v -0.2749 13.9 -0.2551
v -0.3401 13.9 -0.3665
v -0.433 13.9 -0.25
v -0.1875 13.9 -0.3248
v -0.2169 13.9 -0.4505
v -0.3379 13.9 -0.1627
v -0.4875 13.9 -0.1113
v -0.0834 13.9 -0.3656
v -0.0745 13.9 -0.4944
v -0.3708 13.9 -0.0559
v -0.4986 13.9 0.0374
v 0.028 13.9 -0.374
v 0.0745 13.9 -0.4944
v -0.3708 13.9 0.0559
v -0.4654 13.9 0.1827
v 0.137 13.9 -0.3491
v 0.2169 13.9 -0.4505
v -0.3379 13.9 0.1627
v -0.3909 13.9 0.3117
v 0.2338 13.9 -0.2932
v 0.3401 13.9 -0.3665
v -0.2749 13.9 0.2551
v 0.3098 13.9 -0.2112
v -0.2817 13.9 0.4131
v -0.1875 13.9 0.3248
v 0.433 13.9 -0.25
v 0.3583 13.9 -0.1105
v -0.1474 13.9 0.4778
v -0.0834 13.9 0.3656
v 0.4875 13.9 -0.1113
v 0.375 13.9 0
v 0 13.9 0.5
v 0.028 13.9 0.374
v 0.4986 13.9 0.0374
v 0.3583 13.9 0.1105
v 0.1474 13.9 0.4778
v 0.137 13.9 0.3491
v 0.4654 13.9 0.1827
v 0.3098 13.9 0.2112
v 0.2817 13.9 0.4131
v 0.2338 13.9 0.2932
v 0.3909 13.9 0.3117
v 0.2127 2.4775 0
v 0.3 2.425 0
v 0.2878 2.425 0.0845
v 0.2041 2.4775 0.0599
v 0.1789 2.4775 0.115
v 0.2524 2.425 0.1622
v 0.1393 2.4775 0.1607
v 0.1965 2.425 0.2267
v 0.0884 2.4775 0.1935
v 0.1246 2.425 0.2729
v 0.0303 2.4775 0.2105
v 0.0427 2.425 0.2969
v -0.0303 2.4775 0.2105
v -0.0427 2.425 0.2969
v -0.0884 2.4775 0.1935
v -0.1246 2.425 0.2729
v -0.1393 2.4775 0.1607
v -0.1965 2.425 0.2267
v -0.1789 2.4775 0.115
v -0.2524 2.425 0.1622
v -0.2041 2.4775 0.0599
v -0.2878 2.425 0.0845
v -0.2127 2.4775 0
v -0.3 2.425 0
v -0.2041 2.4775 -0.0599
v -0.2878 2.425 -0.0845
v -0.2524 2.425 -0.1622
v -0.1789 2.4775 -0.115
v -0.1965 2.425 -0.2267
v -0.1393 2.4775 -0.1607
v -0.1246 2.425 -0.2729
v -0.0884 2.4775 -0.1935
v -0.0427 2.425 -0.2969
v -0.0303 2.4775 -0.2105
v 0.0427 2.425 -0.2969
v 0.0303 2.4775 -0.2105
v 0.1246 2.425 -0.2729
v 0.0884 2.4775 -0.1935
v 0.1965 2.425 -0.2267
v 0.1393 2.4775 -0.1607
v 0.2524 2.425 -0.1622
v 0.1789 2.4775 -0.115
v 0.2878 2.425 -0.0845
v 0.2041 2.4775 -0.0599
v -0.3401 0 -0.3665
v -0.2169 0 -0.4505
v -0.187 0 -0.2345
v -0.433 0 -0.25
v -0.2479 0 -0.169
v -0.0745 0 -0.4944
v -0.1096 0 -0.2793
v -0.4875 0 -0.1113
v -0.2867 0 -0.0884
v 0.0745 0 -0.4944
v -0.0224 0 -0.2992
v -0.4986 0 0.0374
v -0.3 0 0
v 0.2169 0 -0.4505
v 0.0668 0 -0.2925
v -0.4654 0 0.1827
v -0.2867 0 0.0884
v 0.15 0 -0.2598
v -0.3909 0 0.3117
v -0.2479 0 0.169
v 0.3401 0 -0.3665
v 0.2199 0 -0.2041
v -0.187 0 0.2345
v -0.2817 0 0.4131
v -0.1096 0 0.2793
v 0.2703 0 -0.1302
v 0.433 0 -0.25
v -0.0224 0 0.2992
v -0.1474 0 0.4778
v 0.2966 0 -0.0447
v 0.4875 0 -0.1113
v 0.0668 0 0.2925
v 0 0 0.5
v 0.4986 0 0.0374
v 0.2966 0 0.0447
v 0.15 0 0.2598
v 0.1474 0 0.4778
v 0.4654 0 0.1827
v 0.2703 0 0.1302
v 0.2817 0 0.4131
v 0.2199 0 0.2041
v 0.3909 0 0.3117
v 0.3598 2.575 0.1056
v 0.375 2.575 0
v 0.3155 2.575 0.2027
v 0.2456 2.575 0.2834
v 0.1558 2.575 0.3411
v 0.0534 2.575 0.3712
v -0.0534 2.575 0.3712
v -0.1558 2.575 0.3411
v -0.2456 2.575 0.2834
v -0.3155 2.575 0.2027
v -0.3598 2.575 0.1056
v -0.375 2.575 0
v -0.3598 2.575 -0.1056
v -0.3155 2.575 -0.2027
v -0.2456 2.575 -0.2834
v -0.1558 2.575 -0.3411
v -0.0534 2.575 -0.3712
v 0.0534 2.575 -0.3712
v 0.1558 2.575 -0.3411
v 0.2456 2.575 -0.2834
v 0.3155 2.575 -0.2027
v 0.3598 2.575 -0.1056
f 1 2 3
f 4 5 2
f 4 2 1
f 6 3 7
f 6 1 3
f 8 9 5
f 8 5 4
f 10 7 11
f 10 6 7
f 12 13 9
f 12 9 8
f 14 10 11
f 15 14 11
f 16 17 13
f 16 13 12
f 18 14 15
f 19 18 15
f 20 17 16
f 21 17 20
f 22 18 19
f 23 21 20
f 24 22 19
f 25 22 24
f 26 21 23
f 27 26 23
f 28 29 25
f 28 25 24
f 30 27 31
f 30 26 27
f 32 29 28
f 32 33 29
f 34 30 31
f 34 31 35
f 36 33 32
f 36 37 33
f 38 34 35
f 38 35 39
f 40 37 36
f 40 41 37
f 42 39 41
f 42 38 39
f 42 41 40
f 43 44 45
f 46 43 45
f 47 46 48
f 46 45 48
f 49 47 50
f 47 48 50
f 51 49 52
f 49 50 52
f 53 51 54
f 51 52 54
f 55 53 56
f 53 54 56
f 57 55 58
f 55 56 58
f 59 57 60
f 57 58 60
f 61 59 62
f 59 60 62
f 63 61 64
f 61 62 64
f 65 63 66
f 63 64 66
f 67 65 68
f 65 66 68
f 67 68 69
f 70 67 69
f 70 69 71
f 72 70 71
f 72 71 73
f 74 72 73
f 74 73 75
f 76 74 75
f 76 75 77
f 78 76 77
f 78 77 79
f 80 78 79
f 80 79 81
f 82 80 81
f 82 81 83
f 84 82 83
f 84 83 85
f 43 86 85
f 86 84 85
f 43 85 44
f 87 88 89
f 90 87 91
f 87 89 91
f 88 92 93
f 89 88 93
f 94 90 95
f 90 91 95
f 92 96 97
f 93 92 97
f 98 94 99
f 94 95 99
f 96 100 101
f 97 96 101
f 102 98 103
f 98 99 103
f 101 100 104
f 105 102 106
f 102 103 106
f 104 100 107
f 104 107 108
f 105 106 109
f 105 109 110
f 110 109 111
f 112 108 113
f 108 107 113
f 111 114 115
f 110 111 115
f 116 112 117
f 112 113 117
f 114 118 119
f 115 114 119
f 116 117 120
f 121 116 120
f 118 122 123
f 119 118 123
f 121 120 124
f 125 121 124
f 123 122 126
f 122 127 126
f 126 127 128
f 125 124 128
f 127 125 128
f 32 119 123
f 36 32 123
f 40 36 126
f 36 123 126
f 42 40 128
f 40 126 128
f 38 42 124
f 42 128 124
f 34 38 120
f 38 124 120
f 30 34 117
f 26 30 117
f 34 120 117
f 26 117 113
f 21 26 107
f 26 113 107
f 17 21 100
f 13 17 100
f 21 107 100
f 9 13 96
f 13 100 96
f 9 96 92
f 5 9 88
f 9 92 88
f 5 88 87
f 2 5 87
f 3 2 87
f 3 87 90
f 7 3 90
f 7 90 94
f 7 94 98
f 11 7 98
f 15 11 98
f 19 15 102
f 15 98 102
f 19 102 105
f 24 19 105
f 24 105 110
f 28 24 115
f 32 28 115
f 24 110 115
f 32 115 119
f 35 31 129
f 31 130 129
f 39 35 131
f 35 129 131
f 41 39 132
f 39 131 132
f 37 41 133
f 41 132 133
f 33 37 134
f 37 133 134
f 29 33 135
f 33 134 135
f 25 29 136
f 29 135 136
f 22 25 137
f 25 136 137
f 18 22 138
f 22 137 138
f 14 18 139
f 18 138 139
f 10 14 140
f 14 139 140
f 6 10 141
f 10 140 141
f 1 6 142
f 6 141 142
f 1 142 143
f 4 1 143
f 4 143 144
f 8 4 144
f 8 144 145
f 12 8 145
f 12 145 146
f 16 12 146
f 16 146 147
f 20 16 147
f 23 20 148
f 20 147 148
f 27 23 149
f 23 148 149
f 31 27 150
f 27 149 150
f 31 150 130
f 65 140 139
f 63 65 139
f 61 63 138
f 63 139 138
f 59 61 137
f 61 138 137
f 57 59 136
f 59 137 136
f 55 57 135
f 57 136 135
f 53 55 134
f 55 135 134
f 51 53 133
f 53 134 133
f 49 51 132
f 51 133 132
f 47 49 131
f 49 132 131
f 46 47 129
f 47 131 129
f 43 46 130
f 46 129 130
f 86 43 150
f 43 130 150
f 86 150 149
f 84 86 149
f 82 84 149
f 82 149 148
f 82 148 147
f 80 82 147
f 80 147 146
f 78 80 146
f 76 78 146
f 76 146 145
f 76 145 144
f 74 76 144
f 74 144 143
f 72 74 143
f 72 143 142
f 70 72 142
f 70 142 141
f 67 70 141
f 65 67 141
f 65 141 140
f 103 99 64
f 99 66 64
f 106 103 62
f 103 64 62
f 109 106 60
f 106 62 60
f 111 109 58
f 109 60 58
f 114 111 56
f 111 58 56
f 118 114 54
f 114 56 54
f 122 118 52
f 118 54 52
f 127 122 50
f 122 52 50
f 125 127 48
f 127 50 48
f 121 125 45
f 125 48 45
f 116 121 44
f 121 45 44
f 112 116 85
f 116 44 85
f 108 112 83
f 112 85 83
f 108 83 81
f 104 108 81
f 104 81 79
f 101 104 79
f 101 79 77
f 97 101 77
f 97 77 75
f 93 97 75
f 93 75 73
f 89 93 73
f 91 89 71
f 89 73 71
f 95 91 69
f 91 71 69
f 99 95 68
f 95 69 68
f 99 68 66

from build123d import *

# Parameters (mm, degrees)
SKETCH1_R                        = 0.5
BOSS_EXTRUDE1_DEPTH              = 13.9
F_0_4_0_4_DIAMETER_HOLE1_D       = 0.4
F_0_75_0_75_DIAMETER_HOLE2_D     = 0.75
F_0_75_0_75_DIAMETER_HOLE2_DEPTH = 11.325
F_0_75_0_75_DIAMETER_HOLE2_TIP   = 0.225322732
F_0_6_0_6_DIAMETER_HOLE4_D       = 0.6
F_0_6_0_6_DIAMETER_HOLE4_DEPTH   = 2.425
F_0_6_0_6_DIAMETER_HOLE4_TIP     = 0.180258186


with BuildPart() as part:
    # Sketch1 → Boss-Extrude1 (new body)
    with BuildSketch(Plane(origin=(0, 0, 0), x_dir=(1, 0, 0), z_dir=(0, 1, 0))):
        with Locations(Location((0, 0, 0), (0, 0, 270))):
            Circle(SKETCH1_R)
    extrude(amount=BOSS_EXTRUDE1_DEPTH)

    # Ø0.4 (0.4) Diameter Hole1 (through all)
    with Locations(Plane(origin=(0, 13.9, 0), x_dir=(-1, 0, 0), z_dir=(0, 1, 0))):
        with Locations((0, 0)):
            Hole(F_0_4_0_4_DIAMETER_HOLE1_D / 2)

    # Ø0.75 (0.75) Diameter Hole2
    with Locations(Plane(origin=(0, 13.9, 0), x_dir=(-1, 0, 0), z_dir=(0, 1, 0))):
        with Locations((0, 0)):
            Hole(F_0_75_0_75_DIAMETER_HOLE2_D / 2, depth=F_0_75_0_75_DIAMETER_HOLE2_DEPTH)
            with Locations((0, 0, -(F_0_75_0_75_DIAMETER_HOLE2_DEPTH + F_0_75_0_75_DIAMETER_HOLE2_TIP / 2))):  # 118° drill point
                Cone(0, F_0_75_0_75_DIAMETER_HOLE2_D / 2, F_0_75_0_75_DIAMETER_HOLE2_TIP, mode=Mode.SUBTRACT)

    # Ø0.6 (0.6) Diameter Hole4
    with Locations(Plane.XZ):
        with Locations((0, 0)):
            Hole(F_0_6_0_6_DIAMETER_HOLE4_D / 2, depth=F_0_6_0_6_DIAMETER_HOLE4_DEPTH)
            with Locations((0, 0, -(F_0_6_0_6_DIAMETER_HOLE4_DEPTH + F_0_6_0_6_DIAMETER_HOLE4_TIP / 2))):  # 118° drill point
                Cone(0, F_0_6_0_6_DIAMETER_HOLE4_D / 2, F_0_6_0_6_DIAMETER_HOLE4_TIP, mode=Mode.SUBTRACT)


solid = part.part
